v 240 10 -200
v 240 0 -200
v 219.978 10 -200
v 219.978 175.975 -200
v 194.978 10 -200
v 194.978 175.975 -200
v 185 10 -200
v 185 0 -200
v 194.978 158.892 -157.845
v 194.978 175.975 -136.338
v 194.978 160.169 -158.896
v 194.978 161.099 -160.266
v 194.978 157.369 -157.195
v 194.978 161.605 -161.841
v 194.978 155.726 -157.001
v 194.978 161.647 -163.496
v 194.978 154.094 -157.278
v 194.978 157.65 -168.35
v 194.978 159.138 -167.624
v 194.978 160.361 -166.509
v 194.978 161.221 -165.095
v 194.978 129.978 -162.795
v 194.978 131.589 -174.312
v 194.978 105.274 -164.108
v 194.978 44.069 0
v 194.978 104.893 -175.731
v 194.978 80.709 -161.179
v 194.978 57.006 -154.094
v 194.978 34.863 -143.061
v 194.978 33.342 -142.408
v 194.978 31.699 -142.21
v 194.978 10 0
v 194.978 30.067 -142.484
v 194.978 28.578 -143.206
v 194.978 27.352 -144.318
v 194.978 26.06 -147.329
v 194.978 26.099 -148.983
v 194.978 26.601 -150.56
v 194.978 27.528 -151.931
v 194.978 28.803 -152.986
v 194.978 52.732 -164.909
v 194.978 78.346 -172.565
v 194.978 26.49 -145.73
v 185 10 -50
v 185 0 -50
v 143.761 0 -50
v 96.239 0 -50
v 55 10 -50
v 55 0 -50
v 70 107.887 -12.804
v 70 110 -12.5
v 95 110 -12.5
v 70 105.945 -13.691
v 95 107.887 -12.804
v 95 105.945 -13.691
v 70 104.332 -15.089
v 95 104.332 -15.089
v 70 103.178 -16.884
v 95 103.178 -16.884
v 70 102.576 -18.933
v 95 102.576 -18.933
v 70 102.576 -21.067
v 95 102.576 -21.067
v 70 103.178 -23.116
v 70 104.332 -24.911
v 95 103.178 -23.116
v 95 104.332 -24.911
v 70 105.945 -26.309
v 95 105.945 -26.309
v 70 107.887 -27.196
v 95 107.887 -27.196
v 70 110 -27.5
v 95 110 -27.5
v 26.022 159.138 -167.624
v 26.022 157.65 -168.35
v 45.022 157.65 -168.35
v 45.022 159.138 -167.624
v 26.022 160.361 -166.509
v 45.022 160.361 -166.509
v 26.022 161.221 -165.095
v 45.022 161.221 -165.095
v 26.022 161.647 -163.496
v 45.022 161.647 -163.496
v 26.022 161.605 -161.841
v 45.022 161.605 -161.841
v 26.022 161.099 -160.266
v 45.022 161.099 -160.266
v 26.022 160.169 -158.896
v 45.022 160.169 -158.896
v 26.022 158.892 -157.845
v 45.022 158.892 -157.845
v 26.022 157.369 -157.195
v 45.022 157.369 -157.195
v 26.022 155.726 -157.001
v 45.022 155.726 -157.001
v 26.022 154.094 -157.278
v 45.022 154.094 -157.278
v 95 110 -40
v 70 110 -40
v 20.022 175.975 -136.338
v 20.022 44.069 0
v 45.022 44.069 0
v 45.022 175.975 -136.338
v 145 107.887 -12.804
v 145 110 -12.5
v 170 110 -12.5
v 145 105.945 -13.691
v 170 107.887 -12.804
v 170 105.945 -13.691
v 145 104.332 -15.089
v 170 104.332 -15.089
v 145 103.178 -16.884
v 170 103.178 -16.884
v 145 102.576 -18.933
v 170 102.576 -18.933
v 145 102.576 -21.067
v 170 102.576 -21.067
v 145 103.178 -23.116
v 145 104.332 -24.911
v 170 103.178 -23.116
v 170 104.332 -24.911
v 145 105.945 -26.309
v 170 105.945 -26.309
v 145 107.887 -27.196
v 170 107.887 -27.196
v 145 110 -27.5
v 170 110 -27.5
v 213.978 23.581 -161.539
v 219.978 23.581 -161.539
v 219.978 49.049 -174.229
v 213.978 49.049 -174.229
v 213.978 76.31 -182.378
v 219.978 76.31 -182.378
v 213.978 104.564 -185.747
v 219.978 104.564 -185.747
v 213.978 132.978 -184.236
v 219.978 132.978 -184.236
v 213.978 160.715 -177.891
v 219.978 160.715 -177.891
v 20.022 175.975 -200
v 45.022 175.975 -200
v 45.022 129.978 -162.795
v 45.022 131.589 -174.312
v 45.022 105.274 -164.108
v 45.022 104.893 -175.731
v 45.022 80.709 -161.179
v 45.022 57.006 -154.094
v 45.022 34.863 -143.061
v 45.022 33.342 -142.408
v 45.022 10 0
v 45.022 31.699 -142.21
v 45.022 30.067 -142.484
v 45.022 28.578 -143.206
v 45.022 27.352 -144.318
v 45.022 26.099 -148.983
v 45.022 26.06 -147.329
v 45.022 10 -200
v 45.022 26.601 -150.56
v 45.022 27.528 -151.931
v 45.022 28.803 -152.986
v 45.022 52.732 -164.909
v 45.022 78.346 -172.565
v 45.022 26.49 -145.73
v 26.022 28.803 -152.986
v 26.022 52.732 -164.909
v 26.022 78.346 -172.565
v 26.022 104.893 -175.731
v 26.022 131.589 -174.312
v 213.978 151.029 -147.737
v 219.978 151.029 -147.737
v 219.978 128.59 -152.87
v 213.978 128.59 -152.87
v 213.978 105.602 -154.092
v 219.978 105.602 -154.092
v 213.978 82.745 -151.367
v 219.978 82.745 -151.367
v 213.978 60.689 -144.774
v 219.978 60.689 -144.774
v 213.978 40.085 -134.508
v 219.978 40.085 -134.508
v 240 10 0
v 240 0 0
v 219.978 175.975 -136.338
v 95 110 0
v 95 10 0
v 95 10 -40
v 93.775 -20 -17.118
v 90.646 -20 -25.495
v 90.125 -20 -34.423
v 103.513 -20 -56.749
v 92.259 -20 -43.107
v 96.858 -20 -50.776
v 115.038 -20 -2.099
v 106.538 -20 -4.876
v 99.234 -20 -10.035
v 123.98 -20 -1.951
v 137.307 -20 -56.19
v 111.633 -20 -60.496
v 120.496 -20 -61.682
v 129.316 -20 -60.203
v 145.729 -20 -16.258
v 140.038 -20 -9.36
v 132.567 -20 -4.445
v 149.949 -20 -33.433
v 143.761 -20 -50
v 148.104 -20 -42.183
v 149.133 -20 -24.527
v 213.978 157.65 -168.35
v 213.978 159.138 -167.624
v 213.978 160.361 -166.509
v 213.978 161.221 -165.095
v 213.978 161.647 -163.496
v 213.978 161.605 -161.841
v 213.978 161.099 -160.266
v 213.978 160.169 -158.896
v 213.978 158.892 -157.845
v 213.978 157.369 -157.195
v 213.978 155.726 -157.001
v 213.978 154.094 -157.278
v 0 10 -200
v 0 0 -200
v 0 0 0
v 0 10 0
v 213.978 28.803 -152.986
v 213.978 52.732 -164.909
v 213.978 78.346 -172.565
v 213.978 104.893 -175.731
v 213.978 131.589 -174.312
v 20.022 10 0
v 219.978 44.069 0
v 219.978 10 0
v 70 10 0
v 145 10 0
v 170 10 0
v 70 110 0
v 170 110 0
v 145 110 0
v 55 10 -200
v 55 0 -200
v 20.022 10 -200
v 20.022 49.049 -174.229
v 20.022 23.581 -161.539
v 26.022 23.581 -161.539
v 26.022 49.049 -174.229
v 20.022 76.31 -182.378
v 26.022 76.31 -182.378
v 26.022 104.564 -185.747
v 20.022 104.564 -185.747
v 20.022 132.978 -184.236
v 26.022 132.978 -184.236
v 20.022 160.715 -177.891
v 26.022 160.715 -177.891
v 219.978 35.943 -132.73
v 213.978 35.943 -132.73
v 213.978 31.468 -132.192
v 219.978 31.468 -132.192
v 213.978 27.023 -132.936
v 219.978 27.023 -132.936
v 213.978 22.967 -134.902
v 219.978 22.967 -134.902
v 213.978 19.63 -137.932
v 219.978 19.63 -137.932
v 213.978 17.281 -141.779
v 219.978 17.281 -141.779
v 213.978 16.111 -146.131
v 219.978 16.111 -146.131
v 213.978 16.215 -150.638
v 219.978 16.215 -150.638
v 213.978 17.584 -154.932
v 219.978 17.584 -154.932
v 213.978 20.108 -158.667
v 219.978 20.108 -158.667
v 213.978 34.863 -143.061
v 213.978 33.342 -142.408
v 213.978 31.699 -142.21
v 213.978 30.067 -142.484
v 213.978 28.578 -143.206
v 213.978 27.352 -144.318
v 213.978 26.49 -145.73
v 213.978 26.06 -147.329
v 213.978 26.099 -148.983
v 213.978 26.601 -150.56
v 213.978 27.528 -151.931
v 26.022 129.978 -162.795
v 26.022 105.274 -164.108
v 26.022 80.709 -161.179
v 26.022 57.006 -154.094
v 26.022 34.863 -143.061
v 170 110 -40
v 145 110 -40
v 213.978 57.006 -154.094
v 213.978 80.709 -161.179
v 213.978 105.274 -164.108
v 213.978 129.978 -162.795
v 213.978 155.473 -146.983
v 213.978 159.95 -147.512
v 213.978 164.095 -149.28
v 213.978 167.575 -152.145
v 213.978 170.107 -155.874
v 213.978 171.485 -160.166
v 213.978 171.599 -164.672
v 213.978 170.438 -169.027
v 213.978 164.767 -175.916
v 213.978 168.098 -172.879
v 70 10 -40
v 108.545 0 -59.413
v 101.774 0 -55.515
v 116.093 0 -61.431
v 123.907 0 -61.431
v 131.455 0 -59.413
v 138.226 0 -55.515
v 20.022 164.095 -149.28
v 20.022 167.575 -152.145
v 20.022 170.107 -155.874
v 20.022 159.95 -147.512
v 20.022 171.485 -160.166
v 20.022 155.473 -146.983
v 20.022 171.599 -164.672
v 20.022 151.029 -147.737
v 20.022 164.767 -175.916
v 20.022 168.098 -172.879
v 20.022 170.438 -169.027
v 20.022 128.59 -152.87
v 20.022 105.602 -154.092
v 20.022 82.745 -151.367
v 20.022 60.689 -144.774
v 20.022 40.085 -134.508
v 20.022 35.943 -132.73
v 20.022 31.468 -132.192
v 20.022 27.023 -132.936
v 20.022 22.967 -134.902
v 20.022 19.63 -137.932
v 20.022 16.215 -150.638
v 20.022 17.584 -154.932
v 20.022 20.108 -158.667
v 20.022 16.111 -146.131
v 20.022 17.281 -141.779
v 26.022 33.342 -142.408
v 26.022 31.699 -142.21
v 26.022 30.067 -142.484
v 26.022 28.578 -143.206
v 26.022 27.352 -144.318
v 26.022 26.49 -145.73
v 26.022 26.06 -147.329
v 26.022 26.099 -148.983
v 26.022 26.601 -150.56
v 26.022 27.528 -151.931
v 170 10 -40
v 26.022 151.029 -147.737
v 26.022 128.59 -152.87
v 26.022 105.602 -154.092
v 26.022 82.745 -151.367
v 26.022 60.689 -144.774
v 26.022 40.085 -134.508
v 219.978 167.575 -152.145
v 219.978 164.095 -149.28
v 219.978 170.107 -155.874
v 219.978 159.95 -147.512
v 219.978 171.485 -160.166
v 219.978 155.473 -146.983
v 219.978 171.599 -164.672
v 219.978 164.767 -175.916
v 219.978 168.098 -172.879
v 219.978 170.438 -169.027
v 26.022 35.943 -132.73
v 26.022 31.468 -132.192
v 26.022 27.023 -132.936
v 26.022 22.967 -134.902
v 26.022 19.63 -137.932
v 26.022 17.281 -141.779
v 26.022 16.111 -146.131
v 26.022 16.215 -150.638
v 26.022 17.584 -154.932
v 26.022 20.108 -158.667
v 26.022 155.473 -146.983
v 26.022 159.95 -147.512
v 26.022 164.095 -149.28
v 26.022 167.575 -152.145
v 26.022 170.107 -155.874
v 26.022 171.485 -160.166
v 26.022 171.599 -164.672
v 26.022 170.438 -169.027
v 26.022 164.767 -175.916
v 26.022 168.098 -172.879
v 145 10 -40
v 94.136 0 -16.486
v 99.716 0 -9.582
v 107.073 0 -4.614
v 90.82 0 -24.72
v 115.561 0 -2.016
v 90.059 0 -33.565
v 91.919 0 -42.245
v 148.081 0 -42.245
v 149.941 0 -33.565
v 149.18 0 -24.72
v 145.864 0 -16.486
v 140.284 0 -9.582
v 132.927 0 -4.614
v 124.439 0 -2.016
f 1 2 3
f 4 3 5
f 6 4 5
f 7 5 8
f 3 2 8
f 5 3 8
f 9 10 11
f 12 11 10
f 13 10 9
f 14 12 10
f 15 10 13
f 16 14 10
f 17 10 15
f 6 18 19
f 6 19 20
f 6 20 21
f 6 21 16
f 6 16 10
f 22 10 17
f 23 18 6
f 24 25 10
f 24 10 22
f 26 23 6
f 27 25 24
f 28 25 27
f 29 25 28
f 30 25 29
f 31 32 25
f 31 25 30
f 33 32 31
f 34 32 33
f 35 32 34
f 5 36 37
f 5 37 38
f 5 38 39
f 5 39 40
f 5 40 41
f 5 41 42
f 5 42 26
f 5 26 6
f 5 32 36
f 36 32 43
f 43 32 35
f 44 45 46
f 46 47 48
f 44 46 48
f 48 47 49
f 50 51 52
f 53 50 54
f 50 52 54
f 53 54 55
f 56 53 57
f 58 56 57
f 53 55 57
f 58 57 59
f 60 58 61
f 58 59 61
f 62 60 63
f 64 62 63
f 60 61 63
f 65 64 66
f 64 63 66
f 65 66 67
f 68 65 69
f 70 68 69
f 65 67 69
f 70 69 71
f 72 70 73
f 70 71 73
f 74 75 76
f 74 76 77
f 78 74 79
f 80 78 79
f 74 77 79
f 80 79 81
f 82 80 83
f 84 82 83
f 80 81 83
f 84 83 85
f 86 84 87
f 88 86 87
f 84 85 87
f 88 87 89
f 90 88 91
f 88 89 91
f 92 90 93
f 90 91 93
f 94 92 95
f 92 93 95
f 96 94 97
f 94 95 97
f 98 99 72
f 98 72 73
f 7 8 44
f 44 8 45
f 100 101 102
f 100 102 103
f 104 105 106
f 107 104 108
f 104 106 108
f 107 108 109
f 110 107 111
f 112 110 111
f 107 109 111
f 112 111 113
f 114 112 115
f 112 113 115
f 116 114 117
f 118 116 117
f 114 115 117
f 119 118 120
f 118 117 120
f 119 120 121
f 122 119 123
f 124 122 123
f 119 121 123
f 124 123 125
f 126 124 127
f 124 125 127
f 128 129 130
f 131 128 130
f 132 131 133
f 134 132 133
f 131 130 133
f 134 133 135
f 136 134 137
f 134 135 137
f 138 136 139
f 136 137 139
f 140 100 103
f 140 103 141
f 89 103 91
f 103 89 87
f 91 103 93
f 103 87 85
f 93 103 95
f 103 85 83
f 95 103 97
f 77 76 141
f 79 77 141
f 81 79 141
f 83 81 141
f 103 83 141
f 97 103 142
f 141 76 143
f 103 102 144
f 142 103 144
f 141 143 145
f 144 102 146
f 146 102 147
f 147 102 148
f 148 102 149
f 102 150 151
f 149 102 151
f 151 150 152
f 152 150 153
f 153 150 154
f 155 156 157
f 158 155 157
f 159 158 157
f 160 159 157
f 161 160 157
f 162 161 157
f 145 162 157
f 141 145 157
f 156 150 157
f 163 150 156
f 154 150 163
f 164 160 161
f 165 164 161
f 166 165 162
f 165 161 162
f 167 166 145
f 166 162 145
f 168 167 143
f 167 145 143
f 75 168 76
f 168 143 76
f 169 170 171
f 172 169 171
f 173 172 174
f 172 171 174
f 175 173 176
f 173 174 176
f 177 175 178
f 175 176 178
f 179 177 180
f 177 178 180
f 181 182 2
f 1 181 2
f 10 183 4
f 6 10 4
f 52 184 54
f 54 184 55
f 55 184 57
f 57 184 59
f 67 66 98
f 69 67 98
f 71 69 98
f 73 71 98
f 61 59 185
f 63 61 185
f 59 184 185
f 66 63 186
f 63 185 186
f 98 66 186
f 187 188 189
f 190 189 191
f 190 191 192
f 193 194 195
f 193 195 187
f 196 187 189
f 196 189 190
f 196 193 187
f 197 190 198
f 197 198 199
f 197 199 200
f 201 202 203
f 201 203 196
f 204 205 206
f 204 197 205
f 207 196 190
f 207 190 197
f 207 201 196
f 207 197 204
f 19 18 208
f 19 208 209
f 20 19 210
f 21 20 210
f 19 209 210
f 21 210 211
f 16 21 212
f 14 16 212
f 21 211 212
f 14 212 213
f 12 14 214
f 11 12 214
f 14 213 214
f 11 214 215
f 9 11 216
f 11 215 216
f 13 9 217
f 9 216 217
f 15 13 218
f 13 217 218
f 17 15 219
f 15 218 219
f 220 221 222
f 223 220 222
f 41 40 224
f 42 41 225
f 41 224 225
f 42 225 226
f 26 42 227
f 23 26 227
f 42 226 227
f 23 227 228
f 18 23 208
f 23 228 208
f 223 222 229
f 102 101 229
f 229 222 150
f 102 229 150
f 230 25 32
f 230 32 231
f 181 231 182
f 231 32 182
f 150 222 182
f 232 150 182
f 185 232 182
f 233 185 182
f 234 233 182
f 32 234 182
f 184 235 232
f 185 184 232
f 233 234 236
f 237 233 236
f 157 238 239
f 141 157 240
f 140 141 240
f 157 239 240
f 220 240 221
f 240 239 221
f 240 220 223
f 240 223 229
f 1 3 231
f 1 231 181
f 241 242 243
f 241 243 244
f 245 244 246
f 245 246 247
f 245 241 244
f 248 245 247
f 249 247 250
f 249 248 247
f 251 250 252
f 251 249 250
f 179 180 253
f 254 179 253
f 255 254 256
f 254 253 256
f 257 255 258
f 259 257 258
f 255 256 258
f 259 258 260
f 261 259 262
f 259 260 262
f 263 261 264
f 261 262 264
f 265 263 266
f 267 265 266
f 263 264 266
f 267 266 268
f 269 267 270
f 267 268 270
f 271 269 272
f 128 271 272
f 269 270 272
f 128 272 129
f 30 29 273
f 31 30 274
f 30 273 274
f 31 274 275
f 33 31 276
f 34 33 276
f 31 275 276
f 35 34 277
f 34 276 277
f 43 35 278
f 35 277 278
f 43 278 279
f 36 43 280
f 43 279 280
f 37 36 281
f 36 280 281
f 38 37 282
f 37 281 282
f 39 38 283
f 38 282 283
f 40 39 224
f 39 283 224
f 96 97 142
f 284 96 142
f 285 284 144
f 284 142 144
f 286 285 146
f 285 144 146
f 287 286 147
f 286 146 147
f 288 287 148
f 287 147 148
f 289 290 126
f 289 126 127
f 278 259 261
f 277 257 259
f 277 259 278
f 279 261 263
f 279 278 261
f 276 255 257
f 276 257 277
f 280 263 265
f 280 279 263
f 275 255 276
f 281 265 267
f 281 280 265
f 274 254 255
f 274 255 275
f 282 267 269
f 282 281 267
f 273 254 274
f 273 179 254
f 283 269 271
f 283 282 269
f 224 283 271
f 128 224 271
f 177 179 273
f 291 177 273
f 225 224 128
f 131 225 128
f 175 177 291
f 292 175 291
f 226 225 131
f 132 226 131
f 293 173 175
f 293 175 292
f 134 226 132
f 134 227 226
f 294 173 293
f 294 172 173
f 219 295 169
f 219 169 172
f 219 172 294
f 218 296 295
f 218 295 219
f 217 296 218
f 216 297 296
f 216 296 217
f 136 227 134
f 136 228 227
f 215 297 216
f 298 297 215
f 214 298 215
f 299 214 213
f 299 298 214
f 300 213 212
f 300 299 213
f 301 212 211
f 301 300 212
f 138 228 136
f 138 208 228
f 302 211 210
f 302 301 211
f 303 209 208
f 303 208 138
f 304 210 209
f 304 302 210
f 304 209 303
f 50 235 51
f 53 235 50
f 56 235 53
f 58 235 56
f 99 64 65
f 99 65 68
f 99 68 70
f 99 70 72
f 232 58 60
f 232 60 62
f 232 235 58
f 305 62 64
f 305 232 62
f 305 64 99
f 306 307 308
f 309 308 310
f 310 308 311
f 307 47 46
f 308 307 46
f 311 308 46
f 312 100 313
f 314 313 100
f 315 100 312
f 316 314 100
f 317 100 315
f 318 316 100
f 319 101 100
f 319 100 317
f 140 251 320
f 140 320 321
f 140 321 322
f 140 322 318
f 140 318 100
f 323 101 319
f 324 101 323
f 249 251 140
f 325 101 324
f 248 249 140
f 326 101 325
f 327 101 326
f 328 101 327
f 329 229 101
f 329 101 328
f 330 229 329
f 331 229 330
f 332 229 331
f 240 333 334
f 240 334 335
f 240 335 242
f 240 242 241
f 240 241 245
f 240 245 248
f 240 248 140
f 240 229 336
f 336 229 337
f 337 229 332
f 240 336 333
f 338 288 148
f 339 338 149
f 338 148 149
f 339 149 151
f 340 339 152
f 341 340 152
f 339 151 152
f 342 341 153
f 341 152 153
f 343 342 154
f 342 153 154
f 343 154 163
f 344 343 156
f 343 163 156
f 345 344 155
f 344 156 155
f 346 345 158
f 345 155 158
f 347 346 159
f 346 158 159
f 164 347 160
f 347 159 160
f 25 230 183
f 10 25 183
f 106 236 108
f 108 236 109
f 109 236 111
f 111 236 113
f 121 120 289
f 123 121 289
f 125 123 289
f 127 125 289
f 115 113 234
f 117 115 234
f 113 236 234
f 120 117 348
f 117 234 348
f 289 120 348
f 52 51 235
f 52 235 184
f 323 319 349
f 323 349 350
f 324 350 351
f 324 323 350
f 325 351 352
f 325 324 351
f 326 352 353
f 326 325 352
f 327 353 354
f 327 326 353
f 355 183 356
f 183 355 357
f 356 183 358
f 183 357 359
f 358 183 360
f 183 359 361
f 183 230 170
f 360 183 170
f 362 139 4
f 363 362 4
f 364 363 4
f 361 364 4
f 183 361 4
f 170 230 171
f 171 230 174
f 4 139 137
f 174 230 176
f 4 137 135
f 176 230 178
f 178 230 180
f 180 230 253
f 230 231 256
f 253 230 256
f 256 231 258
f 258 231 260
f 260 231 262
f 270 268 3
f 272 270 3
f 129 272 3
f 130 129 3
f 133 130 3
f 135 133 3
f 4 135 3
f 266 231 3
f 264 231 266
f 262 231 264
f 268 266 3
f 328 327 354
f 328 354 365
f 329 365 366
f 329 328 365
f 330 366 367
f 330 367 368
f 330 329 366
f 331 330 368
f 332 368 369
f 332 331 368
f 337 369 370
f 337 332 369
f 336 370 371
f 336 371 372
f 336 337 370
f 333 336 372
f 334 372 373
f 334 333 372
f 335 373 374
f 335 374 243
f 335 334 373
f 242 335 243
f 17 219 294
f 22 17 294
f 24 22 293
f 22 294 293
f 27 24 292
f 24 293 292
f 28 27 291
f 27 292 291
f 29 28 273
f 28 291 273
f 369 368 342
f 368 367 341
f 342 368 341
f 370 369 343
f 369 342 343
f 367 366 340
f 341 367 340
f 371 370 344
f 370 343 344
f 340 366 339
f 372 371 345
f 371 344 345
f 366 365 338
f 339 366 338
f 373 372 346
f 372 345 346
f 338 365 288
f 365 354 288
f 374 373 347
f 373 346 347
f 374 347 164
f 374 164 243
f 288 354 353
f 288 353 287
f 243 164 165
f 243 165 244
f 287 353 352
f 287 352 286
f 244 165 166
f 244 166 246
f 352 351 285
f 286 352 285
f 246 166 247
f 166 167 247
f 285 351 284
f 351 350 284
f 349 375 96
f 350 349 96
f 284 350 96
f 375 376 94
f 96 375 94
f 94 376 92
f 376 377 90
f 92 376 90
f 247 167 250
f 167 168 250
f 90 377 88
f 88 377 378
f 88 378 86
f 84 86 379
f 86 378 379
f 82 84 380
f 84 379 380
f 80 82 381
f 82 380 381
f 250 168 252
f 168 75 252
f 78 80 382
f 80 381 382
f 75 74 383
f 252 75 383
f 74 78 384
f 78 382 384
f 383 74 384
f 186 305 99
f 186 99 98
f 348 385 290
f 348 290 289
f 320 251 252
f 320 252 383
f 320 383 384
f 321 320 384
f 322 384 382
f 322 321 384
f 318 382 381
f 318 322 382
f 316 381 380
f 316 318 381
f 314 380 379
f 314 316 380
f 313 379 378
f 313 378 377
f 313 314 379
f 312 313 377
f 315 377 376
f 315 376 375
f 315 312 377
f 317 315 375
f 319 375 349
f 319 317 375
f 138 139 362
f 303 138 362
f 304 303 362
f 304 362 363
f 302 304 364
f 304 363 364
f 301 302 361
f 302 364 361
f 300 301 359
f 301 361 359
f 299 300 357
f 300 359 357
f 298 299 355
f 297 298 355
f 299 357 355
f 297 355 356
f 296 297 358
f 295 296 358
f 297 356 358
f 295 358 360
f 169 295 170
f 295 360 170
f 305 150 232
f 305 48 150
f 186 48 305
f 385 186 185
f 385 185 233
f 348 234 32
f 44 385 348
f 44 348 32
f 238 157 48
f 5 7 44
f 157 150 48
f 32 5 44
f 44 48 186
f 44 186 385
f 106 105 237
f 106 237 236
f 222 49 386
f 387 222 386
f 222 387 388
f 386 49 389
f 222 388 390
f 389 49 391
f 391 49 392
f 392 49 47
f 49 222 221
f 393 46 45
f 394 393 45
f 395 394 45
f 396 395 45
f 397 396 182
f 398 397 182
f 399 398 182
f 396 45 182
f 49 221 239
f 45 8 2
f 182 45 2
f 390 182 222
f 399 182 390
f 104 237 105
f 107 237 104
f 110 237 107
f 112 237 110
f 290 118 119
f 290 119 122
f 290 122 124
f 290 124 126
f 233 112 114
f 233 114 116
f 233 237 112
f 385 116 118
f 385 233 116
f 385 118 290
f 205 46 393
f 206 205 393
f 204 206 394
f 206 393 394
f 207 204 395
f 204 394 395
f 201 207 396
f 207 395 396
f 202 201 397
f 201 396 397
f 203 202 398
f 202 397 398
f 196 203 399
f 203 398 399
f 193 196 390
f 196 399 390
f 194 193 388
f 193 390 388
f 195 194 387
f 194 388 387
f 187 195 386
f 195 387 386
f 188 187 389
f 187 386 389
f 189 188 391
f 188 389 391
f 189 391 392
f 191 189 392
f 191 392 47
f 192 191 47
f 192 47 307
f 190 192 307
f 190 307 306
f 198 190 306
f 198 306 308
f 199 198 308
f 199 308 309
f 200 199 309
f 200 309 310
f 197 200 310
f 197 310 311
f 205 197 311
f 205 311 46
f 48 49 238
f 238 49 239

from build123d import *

# Parameters (mm, degrees)
AUFSATZ_LINEAR_AUSTRAGEN1_DEPTH = 10
SKIZZE2_W                       = 25
SKIZZE2_H                       = 40
AUFSATZ_LINEAR_AUSTRAGEN2_DEPTH = 100
SKIZZE3_R                       = 7.5
SCHNITT_LINEAR_AUSTRAGEN1_DEPTH = 285.604989415
SKIZZE4_W                       = 25
SKIZZE4_H                       = 200
AUFSATZ_LINEAR_AUSTRAGEN3_DEPTH = 200
SCHNITT_LINEAR_AUSTRAGEN4_REACH = 365.992
SCHNITT_LINEAR_AUSTRAGEN3_DEPTH = 364.992344743
SCHNITT_LINEAR_AUSTRAGEN5_DEPTH = 6
SKIZZE9_R                       = 30
AUFSATZ_LINEAR_AUSTRAGEN4_DEPTH = 20


with BuildPart() as part:
    # Skizze1 → Aufsatz-Linear austragen1 (new body)
    with BuildSketch(Plane(origin=(0, 0, 0), x_dir=(1, 0, 0), z_dir=(0, 1, 0))):
        Polygon((0, 0), (240, 0), (240, 200), (185, 200), (185, 50), (55, 50), (55, 200), (0, 200), align=None)
    extrude(amount=AUFSATZ_LINEAR_AUSTRAGEN1_DEPTH)

    # Skizze2 → Aufsatz-Linear austragen2 (add)
    with BuildSketch(Plane(origin=(0, 10, 0), x_dir=(1, 0, 0), z_dir=(0, 1, 0))):
        with Locations((157.5, 20)):
            Rectangle(SKIZZE2_W, SKIZZE2_H)
        with Locations((82.5, 20)):
            Rectangle(SKIZZE2_W, SKIZZE2_H)
    extrude(amount=AUFSATZ_LINEAR_AUSTRAGEN2_DEPTH)

    # Skizze3 → Schnitt-Linear austragen1 (cut, through all)
    with BuildSketch(Plane(origin=(170, 0, 0), x_dir=(0, 0, -1), z_dir=(1, 0, 0))):
        with Locations((20, 110)):
            Circle(SKIZZE3_R)
    extrude(amount=-SCHNITT_LINEAR_AUSTRAGEN1_DEPTH, mode=Mode.SUBTRACT)

    # Skizze4 → Aufsatz-Linear austragen3 (add)
    with BuildSketch(Plane(origin=(0, 10, 0), x_dir=(1, 0, 0), z_dir=(0, 1, 0))):
        with Locations((207.478242177, 100)):
            Rectangle(SKIZZE4_W, SKIZZE4_H)
        with Locations((32.521757823, 100)):
            Rectangle(SKIZZE4_W, SKIZZE4_H)
    extrude(amount=AUFSATZ_LINEAR_AUSTRAGEN3_DEPTH)

    # Skizze7 → Schnitt-Linear austragen4 (cut, up to next)
    with BuildSketch(Plane(origin=(219.978242177, 0, 0), x_dir=(0, 0, -1), z_dir=(1, 0, 0)), mode=Mode.PRIVATE) as schnitt_linear_austragen4_sk1:
        Polygon((0, 44.069377938), (136.337930206, 175.975272551), (200, 175.975272551), (200, 225.622509637), (-41.808038164, 225.622509637), align=None)
    schnitt_linear_austragen4_tool1 = extrude(schnitt_linear_austragen4_sk1.sketch, amount=-SCHNITT_LINEAR_AUSTRAGEN4_REACH, mode=Mode.PRIVATE) & part.part
    schnitt_linear_austragen4 = schnitt_linear_austragen4_tool1.solids().sort_by_distance((219.978242, 167.605519, -59.370877))[0]
    add(schnitt_linear_austragen4, mode=Mode.SUBTRACT)

    # Skizze6 → Schnitt-Linear austragen3 (cut, through all)
    with BuildSketch(Plane(origin=(219.978242177, 0, 0), x_dir=(0, 0, -1), z_dir=(1, 0, 0))):
        with BuildLine():
            ThreePointArc((152.985895116, 28.803269607), (174.718481208, 91.551452657), (168.349561926, 157.650443887))
            ThreePointArc((168.349561926, 157.650443887), (161.035471277, 161.408211518), (157.277703645, 154.094120869))
            ThreePointArc((157.277703645, 154.094120869), (163.171287707, 92.928333715), (143.060682227, 34.863271943))
            ThreePointArc((143.060682227, 34.863271943), (144.993287504, 26.870664331), (152.985895116, 28.803269607))
        make_face()
    extrude(amount=-SCHNITT_LINEAR_AUSTRAGEN3_DEPTH, mode=Mode.SUBTRACT)

    # Skizze8 → Schnitt-Linear austragen5 (cut)
    with BuildSketch(Plane(origin=(219.978242177, 0, 0), x_dir=(0, 0, -1), z_dir=(1, 0, 0))):
        with BuildLine():
            ThreePointArc((161.538964629, 23.581052028), (184.669295342, 90.364923006), (177.890755105, 160.715111448))
            ThreePointArc((177.890755105, 160.715111448), (157.970803716, 170.949404697), (147.736510466, 151.029453308))
            ThreePointArc((147.736510466, 151.029453308), (153.220473573, 94.114863367), (134.507612714, 40.085489522))
            ThreePointArc((134.507612714, 40.085489522), (139.771069924, 18.317594818), (161.538964629, 23.581052028))
        make_face()
    schnitt_linear_austragen5 = extrude(amount=-SCHNITT_LINEAR_AUSTRAGEN5_DEPTH, mode=Mode.SUBTRACT)

    # Spiegeln1: Schnitt-Linear austragen4, Schnitt-Linear austragen5 across plane
    add(schnitt_linear_austragen4.mirror(Plane(origin=(120, 0, 0), x_dir=(0, 0, 1), z_dir=(1, 0, 0))), mode=Mode.SUBTRACT)
    add(schnitt_linear_austragen5.mirror(Plane(origin=(120, 0, 0), x_dir=(0, 0, 1), z_dir=(1, 0, 0))), mode=Mode.SUBTRACT)

    # Skizze9 → Aufsatz-Linear austragen4 (add)
    with BuildSketch(Plane.XZ):
        with Locations(Location((120, -31.686005805, 0), (0, 0, 322.37676034))):
            Circle(SKIZZE9_R)
    extrude(amount=AUFSATZ_LINEAR_AUSTRAGEN4_DEPTH)


solid = part.part
